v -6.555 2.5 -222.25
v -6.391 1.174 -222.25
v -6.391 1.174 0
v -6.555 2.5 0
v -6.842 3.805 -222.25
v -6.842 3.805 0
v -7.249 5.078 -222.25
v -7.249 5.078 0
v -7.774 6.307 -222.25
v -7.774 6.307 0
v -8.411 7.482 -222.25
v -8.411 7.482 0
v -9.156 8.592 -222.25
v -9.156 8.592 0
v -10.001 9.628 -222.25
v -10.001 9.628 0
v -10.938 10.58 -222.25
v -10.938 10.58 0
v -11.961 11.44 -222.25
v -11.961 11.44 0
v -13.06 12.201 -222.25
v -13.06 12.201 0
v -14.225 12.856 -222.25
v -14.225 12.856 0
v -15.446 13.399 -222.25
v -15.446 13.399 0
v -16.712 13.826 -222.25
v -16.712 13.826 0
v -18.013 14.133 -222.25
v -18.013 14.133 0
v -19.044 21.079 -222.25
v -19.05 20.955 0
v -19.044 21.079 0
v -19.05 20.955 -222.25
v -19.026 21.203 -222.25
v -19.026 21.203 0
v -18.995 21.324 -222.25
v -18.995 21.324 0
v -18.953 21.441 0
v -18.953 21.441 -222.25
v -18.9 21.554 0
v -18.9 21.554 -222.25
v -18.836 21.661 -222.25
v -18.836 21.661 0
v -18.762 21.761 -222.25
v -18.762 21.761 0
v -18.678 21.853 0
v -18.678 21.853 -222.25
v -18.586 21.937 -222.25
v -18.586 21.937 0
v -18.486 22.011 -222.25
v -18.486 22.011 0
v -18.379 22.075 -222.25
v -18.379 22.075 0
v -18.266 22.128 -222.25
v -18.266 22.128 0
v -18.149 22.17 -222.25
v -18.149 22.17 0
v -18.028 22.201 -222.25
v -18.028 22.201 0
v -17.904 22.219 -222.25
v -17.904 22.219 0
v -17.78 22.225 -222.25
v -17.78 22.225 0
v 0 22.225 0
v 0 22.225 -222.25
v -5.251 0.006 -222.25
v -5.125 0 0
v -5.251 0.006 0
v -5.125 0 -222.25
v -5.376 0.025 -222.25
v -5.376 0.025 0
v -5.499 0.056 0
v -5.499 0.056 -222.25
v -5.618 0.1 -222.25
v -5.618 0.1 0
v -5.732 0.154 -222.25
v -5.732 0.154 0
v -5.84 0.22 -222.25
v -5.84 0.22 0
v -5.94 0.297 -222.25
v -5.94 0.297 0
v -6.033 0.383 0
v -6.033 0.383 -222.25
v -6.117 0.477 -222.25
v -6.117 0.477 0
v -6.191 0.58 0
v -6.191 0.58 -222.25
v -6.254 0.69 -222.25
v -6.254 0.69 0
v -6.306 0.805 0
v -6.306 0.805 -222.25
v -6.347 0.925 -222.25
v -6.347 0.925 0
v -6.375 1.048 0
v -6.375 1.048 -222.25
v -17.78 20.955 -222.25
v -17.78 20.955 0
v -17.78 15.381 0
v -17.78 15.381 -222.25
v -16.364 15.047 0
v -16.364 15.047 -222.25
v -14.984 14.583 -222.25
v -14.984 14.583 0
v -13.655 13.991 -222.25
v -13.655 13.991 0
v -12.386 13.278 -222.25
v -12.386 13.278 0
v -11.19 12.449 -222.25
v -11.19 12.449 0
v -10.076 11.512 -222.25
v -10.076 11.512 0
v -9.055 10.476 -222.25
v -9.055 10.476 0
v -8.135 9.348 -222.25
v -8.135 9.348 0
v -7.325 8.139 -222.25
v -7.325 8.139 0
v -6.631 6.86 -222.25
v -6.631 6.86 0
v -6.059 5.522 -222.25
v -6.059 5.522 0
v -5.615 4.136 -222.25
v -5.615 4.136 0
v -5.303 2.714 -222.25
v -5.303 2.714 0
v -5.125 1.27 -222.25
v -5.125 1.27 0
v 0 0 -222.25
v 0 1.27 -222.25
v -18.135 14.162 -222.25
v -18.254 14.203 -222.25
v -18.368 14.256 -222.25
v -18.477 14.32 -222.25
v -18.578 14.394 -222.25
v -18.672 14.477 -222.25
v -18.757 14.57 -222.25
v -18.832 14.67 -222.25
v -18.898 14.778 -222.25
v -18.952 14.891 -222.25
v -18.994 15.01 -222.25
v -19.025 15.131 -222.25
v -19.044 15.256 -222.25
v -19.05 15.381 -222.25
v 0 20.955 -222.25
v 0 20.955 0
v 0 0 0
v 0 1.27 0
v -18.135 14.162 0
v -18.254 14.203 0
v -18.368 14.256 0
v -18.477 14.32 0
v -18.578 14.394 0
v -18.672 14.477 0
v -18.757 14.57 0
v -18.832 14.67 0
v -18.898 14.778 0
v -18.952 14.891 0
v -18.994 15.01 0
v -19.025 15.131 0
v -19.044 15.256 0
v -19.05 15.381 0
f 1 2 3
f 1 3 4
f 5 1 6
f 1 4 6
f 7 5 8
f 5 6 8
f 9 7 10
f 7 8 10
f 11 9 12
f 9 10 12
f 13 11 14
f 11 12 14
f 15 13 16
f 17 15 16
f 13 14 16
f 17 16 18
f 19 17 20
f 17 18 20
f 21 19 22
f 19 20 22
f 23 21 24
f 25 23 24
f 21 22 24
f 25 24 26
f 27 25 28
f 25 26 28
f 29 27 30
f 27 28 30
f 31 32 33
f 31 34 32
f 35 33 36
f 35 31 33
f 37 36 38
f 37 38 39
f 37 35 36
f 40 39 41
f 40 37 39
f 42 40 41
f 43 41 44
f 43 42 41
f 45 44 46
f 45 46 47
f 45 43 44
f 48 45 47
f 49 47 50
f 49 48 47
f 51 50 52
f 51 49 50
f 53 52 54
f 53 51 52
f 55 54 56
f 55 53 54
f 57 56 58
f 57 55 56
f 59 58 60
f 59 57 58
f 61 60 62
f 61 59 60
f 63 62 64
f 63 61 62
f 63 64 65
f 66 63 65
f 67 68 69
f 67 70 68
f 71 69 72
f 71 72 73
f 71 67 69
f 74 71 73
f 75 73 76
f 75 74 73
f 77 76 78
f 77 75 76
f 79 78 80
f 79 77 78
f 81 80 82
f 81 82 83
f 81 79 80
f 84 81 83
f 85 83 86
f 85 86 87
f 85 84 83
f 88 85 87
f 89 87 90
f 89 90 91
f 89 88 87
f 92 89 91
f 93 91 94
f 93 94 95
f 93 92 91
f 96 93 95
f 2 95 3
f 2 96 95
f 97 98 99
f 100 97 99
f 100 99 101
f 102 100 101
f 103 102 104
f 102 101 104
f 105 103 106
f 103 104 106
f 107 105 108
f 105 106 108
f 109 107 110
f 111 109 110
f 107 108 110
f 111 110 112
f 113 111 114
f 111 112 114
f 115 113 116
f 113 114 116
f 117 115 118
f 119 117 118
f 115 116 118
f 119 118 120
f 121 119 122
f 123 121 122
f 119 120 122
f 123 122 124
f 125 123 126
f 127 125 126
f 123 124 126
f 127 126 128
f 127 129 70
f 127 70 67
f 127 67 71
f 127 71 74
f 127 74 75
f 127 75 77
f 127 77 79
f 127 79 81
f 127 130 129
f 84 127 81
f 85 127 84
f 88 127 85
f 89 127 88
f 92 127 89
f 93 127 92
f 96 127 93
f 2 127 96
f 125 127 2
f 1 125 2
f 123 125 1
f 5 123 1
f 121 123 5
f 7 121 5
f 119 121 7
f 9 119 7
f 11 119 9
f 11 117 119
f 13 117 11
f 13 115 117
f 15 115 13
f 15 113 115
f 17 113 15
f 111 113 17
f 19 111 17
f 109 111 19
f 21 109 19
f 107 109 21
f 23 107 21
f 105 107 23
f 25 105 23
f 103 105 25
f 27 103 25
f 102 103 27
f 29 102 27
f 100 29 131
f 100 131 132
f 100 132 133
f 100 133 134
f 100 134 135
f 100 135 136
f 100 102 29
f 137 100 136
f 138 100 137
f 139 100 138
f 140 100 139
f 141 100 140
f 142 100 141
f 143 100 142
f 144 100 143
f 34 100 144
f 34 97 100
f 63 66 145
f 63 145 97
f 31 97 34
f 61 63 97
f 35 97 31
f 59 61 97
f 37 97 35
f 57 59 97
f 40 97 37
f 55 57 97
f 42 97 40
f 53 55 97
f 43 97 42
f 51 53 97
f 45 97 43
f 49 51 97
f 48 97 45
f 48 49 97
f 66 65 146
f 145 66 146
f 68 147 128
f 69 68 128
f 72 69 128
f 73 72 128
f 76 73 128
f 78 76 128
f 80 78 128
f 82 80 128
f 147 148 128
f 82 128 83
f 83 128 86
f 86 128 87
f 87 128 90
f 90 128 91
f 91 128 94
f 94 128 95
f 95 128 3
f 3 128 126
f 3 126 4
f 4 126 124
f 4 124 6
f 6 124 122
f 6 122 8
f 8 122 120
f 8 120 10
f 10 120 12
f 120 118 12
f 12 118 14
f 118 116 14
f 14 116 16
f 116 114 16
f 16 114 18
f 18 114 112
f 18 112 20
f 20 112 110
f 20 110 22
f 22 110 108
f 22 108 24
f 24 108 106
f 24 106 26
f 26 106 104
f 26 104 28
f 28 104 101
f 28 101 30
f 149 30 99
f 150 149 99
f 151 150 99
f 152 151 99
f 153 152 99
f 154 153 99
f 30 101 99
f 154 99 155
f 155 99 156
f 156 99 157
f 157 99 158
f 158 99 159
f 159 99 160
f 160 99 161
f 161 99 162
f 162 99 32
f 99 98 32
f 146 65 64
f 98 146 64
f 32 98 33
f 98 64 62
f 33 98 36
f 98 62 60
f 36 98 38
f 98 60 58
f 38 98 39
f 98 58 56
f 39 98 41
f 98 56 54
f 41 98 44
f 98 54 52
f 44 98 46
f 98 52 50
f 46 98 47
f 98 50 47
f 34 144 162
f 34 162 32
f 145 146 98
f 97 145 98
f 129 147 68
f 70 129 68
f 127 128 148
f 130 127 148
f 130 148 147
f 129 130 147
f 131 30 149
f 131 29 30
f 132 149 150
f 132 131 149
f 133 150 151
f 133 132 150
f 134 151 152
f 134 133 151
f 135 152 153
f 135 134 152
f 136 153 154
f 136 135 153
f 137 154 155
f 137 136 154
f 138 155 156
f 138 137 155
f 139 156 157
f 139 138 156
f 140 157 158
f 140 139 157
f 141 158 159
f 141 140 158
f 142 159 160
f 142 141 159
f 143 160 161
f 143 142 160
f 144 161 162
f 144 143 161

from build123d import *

# Parameters (mm, degrees)
EXTRUDE_THIN1_DEPTH = 222.25
FILLET1_R           = 1.27


with BuildPart() as part:
    # Sketch1 → Extrude-Thin1 (new body)
    with BuildSketch(Plane.XY):
        with BuildLine():
            Line((0, 0), (-6.35, 0))
            ThreePointArc((-6.35, 0), (-9.958615648, 9.580536091), (-19.05, 14.2875))
            Line((-19.05, 14.2875), (-19.05, 22.225))
            Line((-19.05, 22.225), (0, 22.225))
            Line((0, 22.225), (0, 20.955))
            Line((0, 20.955), (-17.78, 20.955))
            Line((-17.78, 20.955), (-17.78, 15.381314))
            ThreePointArc((-17.78, 15.381314), (-9.055144579, 10.475506123), (-5.12465987, 1.27))
            Line((-5.12465987, 1.27), (0, 1.27))
            Line((0, 1.27), (0, 0))
        make_face()
    extrude(amount=-EXTRUDE_THIN1_DEPTH)

    # Fillet1
    fillet1_edges = [part.edges().sort_by_distance(p)[0] for p in [
        (-6.35, 0, -111.125),
        (-19.05, 14.2875, -111.125),
        (-19.05, 22.225, -111.125),
    ]]
    fillet(fillet1_edges, radius=FILLET1_R)


solid = part.part
